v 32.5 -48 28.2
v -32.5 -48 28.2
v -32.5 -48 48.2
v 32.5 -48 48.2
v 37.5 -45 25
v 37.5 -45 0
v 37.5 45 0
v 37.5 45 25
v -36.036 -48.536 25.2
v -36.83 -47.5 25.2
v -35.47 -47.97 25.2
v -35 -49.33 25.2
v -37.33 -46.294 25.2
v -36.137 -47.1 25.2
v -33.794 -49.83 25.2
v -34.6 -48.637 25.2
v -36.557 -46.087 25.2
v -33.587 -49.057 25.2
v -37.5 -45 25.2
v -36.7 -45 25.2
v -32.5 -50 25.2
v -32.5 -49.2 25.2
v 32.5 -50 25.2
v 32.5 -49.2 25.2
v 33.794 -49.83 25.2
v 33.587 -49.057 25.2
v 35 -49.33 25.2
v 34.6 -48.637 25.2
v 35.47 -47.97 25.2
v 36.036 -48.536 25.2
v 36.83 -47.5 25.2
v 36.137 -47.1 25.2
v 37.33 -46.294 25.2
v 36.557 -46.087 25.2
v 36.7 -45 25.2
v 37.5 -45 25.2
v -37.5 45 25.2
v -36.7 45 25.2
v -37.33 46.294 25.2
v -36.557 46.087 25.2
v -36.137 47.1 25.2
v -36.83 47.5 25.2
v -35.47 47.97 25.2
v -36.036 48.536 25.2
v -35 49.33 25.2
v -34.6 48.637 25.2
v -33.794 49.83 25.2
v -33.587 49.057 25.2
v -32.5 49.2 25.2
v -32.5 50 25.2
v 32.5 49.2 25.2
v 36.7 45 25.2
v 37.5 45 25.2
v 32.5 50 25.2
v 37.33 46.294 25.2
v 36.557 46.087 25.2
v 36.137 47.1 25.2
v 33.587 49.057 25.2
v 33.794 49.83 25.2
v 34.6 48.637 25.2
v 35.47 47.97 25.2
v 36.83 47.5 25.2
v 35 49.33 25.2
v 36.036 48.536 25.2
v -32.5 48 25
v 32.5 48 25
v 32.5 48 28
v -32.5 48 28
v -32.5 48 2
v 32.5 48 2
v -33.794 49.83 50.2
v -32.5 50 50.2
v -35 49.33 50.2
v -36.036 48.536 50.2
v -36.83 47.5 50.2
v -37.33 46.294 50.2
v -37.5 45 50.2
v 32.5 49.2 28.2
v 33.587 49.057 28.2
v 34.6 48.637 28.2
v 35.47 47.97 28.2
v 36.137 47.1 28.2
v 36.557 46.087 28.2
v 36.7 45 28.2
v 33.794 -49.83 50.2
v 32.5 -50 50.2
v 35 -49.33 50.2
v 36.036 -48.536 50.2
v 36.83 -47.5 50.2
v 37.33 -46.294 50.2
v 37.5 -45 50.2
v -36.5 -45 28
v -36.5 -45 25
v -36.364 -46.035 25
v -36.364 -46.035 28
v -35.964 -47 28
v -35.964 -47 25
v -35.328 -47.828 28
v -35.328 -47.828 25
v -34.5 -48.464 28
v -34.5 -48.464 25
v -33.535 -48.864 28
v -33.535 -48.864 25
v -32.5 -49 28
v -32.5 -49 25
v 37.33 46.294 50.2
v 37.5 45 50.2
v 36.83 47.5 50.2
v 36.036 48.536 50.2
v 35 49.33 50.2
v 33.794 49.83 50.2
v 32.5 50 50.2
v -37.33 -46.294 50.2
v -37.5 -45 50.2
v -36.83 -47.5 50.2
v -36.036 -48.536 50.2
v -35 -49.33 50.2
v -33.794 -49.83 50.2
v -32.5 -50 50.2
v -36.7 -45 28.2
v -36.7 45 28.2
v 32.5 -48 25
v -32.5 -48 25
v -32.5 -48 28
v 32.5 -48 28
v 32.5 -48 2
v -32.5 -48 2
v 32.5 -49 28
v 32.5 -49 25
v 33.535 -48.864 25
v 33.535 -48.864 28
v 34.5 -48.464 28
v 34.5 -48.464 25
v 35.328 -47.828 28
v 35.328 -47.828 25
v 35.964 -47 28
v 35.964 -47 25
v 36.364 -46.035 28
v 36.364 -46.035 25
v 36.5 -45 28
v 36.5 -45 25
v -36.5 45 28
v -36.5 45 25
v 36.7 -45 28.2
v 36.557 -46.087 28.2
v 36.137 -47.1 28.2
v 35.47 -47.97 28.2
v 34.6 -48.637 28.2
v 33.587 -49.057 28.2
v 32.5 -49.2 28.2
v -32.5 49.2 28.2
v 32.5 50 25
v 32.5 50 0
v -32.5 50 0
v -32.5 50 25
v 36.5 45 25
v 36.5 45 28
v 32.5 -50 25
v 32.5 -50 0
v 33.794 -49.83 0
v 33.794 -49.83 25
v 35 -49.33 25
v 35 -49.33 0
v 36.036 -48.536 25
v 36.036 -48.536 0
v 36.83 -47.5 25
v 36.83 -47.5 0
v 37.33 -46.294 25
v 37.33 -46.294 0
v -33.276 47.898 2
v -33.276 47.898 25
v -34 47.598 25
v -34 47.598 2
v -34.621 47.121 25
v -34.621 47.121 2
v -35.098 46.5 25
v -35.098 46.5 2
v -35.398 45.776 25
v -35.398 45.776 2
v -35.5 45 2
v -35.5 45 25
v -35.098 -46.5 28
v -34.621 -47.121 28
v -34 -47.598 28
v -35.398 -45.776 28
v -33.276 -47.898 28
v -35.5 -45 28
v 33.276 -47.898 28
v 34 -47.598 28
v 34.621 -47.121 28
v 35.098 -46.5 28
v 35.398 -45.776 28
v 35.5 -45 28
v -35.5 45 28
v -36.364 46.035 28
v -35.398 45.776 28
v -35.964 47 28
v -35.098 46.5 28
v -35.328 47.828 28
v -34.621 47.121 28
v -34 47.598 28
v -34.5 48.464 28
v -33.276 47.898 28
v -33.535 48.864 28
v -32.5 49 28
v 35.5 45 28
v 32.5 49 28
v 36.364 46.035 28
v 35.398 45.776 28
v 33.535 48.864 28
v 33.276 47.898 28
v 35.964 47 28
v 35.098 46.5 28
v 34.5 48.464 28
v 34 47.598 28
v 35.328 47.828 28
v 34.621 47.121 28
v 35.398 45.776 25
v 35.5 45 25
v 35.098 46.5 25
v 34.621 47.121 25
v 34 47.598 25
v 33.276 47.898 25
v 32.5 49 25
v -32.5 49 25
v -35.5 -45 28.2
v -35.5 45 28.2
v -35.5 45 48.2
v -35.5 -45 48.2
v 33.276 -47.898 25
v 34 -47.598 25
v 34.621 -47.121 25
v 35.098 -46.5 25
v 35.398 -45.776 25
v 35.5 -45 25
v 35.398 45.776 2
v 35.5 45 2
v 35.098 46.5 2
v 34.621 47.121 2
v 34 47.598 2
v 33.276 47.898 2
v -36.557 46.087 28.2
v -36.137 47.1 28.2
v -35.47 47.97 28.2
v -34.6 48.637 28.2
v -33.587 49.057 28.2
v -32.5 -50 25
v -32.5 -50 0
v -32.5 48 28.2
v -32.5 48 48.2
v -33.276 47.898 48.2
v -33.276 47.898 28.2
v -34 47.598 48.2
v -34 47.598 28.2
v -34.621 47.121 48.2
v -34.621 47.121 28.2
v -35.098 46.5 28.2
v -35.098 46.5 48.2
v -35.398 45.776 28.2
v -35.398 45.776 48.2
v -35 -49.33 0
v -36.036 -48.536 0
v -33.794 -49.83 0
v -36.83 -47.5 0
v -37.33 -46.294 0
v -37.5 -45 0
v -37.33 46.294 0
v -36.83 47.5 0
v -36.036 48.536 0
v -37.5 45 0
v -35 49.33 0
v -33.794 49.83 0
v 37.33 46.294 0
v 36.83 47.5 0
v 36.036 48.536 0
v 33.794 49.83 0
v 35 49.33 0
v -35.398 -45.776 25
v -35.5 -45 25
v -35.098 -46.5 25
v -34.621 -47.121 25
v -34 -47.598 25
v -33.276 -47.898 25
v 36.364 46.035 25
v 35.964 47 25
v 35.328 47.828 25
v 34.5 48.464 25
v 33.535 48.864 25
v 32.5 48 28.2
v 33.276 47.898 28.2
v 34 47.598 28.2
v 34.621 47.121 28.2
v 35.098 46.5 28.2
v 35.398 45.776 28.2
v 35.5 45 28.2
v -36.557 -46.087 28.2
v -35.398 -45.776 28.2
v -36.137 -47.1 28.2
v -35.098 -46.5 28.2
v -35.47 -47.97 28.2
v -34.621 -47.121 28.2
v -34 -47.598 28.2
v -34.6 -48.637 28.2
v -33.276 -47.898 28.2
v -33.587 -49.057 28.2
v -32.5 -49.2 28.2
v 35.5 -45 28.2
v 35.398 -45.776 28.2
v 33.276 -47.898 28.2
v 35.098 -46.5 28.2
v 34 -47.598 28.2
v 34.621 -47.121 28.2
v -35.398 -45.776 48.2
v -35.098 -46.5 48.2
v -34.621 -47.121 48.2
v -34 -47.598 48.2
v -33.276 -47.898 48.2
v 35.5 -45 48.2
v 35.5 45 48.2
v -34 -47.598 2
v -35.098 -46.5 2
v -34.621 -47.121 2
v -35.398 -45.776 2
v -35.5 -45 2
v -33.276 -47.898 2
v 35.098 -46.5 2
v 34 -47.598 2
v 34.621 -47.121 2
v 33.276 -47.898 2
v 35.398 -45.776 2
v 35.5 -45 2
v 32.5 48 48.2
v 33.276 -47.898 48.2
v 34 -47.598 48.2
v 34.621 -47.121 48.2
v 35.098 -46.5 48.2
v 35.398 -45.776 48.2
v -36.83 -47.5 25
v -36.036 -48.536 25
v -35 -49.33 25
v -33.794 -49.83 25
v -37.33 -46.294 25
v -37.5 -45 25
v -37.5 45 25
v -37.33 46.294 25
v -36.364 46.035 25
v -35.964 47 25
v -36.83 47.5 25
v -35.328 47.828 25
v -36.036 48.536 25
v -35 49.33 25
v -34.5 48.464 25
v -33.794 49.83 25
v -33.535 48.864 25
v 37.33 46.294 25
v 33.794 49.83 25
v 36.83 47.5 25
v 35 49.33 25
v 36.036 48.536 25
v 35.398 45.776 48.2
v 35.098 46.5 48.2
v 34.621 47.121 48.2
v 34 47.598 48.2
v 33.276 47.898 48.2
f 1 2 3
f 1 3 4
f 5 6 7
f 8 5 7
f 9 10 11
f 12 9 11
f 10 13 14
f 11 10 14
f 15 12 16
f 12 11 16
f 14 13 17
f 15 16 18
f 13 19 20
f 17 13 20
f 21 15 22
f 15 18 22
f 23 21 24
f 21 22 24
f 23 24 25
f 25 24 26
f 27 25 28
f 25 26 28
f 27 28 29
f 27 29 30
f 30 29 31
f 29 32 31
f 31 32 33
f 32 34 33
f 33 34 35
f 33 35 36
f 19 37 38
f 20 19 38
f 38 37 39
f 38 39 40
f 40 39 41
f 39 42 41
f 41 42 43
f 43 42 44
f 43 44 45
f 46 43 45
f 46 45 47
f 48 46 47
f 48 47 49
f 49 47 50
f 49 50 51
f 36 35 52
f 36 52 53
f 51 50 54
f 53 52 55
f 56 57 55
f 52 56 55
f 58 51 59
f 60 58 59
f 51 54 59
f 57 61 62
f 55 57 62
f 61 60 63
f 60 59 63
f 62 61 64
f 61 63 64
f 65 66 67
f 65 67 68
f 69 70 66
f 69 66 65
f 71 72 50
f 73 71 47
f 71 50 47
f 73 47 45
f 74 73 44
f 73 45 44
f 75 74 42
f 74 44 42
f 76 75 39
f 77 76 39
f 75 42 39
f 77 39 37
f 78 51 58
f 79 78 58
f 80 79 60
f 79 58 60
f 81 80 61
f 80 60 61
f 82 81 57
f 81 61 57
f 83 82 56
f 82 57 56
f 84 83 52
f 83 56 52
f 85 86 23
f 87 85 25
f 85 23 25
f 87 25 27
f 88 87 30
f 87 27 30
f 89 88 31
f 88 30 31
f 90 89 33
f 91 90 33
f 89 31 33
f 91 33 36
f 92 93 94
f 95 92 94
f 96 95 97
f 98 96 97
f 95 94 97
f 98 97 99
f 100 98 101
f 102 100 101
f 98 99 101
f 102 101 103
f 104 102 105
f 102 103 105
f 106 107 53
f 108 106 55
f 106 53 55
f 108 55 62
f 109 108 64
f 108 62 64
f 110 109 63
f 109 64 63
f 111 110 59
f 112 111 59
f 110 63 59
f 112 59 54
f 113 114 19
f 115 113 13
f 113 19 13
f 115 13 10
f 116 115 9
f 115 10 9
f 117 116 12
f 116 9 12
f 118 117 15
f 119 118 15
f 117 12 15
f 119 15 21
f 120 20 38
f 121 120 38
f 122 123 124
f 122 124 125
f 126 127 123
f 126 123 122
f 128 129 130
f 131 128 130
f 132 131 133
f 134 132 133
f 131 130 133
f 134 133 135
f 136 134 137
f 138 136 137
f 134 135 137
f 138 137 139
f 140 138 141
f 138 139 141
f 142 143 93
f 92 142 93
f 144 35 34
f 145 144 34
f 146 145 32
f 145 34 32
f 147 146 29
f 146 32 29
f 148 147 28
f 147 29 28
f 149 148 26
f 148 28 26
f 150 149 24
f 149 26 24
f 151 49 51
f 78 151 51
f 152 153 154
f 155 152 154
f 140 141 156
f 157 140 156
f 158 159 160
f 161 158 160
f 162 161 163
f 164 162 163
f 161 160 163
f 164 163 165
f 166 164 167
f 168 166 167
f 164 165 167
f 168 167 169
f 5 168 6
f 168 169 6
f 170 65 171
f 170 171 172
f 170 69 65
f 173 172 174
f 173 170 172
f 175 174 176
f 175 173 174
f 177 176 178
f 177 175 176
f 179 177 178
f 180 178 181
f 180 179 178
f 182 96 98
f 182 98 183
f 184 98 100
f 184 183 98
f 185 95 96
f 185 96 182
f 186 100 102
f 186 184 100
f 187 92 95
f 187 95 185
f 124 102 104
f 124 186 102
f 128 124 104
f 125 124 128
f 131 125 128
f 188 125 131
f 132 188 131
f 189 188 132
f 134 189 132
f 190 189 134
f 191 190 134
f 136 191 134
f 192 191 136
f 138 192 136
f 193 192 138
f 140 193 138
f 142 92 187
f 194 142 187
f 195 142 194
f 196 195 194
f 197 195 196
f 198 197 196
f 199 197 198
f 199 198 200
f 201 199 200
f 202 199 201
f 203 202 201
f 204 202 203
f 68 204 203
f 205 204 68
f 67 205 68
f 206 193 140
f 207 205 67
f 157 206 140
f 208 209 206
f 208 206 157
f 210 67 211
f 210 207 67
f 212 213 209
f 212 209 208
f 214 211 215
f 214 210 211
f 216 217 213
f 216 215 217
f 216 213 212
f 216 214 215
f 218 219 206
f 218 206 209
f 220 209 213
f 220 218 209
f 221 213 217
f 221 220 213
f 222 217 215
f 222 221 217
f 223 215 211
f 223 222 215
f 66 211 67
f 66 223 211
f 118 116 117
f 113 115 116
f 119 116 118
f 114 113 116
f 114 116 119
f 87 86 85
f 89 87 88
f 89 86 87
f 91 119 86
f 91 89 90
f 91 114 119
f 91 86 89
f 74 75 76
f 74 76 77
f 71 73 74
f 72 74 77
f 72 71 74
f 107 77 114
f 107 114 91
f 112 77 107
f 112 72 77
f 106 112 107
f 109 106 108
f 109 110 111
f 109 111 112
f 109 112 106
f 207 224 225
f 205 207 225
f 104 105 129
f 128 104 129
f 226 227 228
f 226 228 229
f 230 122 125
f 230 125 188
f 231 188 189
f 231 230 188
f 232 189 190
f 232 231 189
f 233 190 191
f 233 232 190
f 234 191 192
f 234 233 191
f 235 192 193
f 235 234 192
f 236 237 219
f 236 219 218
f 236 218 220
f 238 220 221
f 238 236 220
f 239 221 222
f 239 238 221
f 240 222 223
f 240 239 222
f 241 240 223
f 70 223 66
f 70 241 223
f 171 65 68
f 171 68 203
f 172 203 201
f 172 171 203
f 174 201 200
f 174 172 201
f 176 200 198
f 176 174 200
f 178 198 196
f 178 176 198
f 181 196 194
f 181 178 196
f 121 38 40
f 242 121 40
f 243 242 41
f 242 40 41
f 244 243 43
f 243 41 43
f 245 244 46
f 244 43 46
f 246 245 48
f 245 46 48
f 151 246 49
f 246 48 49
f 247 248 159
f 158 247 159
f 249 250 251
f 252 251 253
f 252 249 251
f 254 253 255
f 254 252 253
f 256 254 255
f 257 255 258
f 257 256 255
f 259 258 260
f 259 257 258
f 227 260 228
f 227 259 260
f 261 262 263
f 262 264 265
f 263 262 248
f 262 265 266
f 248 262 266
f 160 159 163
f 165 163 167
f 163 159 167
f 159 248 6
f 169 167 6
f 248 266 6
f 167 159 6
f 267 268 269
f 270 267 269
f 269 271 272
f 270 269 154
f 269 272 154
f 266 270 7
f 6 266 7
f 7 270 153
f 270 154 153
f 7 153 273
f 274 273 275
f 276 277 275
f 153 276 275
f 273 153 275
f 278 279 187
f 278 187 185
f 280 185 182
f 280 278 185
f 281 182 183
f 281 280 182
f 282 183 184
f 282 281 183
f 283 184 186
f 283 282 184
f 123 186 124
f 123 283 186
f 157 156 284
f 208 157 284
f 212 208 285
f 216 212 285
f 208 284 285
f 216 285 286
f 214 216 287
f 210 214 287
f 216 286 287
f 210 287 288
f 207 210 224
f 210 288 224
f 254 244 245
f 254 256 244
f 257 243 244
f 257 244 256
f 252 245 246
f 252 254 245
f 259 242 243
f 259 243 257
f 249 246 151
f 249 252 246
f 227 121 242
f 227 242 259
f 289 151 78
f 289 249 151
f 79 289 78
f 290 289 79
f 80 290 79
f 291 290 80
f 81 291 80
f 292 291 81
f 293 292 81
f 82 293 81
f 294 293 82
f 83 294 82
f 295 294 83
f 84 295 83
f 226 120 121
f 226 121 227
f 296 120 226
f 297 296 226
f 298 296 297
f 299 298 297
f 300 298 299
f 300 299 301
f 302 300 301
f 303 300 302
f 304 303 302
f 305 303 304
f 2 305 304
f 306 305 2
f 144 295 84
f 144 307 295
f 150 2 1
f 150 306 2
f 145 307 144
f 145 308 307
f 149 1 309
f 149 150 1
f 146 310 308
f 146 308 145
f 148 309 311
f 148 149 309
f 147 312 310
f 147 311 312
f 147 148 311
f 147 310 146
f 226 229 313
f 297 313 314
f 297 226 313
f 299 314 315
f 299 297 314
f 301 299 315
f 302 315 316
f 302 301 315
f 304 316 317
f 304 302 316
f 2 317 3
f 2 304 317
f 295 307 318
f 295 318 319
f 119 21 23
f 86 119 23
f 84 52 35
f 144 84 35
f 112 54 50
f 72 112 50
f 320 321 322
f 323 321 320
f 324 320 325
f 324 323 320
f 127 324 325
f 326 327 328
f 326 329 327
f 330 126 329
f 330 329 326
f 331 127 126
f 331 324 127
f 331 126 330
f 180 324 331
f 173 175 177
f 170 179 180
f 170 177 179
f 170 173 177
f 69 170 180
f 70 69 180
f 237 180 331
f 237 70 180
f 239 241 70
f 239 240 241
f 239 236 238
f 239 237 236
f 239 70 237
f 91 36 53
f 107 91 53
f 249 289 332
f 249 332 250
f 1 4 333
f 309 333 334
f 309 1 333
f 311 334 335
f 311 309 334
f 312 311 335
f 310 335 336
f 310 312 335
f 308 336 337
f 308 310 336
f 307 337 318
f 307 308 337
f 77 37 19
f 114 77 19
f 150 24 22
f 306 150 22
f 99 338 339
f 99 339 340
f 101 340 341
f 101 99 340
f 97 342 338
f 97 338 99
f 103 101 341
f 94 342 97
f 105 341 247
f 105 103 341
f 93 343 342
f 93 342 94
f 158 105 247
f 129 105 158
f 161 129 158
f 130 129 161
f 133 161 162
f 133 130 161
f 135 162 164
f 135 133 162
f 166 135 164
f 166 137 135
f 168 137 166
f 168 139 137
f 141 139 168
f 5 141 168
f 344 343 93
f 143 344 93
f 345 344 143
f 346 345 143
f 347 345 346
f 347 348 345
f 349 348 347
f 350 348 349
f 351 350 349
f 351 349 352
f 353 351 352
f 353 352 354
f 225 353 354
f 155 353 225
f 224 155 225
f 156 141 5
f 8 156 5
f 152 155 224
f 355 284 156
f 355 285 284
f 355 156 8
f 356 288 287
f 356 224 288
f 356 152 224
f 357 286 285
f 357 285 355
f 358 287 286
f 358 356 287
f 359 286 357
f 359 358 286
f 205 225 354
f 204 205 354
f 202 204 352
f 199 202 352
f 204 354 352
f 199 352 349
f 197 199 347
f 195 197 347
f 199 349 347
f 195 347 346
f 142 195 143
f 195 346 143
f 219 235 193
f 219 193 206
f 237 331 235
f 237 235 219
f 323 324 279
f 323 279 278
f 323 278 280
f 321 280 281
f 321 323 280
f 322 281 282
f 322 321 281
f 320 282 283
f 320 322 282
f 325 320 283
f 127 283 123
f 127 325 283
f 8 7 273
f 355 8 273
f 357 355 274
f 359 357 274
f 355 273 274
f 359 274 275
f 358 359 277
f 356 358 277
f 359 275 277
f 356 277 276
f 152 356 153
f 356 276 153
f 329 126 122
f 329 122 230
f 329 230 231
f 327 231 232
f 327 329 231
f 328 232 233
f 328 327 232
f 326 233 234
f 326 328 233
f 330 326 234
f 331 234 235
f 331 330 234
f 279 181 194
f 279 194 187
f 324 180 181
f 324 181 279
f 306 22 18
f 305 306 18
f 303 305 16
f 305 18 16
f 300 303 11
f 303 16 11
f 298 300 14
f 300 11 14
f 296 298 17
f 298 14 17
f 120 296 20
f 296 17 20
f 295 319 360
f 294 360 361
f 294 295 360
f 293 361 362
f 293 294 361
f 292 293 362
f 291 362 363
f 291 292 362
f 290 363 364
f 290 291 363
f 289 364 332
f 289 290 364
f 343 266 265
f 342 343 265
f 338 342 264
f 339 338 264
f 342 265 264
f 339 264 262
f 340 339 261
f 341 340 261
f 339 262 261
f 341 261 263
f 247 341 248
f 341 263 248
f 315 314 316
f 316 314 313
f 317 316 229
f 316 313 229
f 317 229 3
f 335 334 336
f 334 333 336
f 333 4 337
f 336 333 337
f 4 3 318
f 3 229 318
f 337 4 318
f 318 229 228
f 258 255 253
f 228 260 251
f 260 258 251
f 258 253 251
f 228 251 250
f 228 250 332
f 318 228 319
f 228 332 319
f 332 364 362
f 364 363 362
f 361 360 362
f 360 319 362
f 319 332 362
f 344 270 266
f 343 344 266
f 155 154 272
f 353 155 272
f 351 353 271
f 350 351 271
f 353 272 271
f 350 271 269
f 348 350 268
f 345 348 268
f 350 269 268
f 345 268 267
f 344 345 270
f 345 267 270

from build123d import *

# Parameters (mm, degrees)
PAD_DEPTH      = 25
THICKNESS_T    = -2
PAD001_DEPTH   = 3
PAD002_DEPTH   = 25
THICKNESS001_T = -2
POCKET_DEPTH   = 3


with BuildPart() as base:
    # Sketch → Pad (new body)
    with BuildSketch(Plane.XY):
        with BuildLine():
            Line((-37.5, 45), (-37.5, -45))
            ThreePointArc((-37.5, -45), (-36.035534, -48.535534), (-32.5, -50))
            Line((-32.5, -50), (32.5, -50))
            ThreePointArc((32.5, -50), (36.035534, -48.535534), (37.5, -45))
            Line((37.5, -45), (37.5, 45))
            ThreePointArc((37.5, 45), (36.035534, 48.535534), (32.5, 50))
            Line((32.5, 50), (-32.5, 50))
            ThreePointArc((-32.5, 50), (-36.035534, 48.535534), (-37.5, 45))
        make_face()
    extrude(amount=PAD_DEPTH)

    # Thickness
    thickness_openings = [base.faces().sort_by_distance(p)[0] for p in [
        (0, 0, 25),
    ]]
    offset(amount=THICKNESS_T, openings=thickness_openings)

    # Sketch001 (on Face10 of Thickness) → Pad001 (join)
    with BuildSketch(Plane.XY.offset(25)):
        with BuildLine():
            Line((-36.5, 45), (-36.5, -45))
            ThreePointArc((-36.5, -45), (-35.328427, -47.828427), (-32.5, -49))
            Line((-32.5, -49), (32.5, -49))
            ThreePointArc((32.5, -49), (35.328427, -47.828427), (36.5, -45))
            Line((36.5, -45), (36.5, 45))
            ThreePointArc((36.5, 45), (35.328427, 47.828427), (32.5, 49))
            Line((32.5, 49), (-32.5, 49))
            ThreePointArc((-32.5, 49), (-35.328427, 47.828427), (-36.5, 45))
        make_face()
        with BuildLine():
            Line((-35.5, 45), (-35.5, -45))
            ThreePointArc((-35.5, -45), (-34.62132, -47.12132), (-32.5, -48))
            Line((-32.5, -48), (32.5, -48))
            ThreePointArc((32.5, -48), (34.62132, -47.12132), (35.5, -45))
            Line((35.5, -45), (35.5, 45))
            ThreePointArc((35.5, 45), (34.62132, 47.12132), (32.5, 48))
            Line((32.5, 48), (-32.5, 48))
            ThreePointArc((-32.5, 48), (-34.62132, 47.12132), (-35.5, 45))
        make_face(mode=Mode.SUBTRACT)
    extrude(amount=PAD001_DEPTH)


with BuildPart() as lid:
    # Sketch002 → Pad002 (new body)
    with BuildSketch(Plane.XY.offset(25.2)):
        with BuildLine():
            Line((-37.5, 45), (-37.5, -45))
            ThreePointArc((-37.5, -45), (-36.035534, -48.535534), (-32.5, -50))
            Line((-32.5, -50), (32.5, -50))
            ThreePointArc((32.5, -50), (36.035534, -48.535534), (37.5, -45))
            Line((37.5, -45), (37.5, 45))
            ThreePointArc((37.5, 45), (36.035534, 48.535534), (32.5, 50))
            Line((32.5, 50), (-32.5, 50))
            ThreePointArc((-32.5, 50), (-36.035534, 48.535534), (-37.5, 45))
        make_face()
    extrude(amount=PAD002_DEPTH)

    # Thickness001
    thickness001_openings = [lid.faces().sort_by_distance(p)[0] for p in [
        (0, 0, 25.2),
    ]]
    offset(amount=THICKNESS001_T, openings=thickness001_openings)

    # Sketch003 (on Face10 of Thickness001) → Pocket (cut)
    with BuildSketch(Plane(origin=(0, 0, 25.2), x_dir=(1, 0, 0), z_dir=(0, 0, -1))):
        with BuildLine():
            Line((-36.7, 45), (-36.7, -45))
            ThreePointArc((-36.7, -45), (-35.469848, -47.969848), (-32.5, -49.2))
            Line((-32.5, -49.2), (32.5, -49.2))
            ThreePointArc((32.5, -49.2), (35.469848, -47.969848), (36.7, -45))
            Line((36.7, -45), (36.7, 45))
            ThreePointArc((36.7, 45), (35.469848, 47.969848), (32.5, 49.2))
            Line((32.5, 49.2), (-32.5, 49.2))
            ThreePointArc((-32.5, 49.2), (-35.469848, 47.969848), (-36.7, 45))
        make_face()
        with BuildLine():
            Line((-35.5, 45), (-35.5, -45))
            ThreePointArc((-35.5, -45), (-34.62132, -47.12132), (-32.5, -48))
            Line((-32.5, -48), (32.5, -48))
            ThreePointArc((32.5, -48), (34.62132, -47.12132), (35.5, -45))
            Line((35.5, -45), (35.5, 45))
            ThreePointArc((35.5, 45), (34.62132, 47.12132), (32.5, 48))
            Line((32.5, 48), (-32.5, 48))
            ThreePointArc((-32.5, 48), (-34.62132, 47.12132), (-35.5, 45))
        make_face(mode=Mode.SUBTRACT)
    extrude(amount=-POCKET_DEPTH, mode=Mode.SUBTRACT)


solid = Compound([base.part, lid.part])
